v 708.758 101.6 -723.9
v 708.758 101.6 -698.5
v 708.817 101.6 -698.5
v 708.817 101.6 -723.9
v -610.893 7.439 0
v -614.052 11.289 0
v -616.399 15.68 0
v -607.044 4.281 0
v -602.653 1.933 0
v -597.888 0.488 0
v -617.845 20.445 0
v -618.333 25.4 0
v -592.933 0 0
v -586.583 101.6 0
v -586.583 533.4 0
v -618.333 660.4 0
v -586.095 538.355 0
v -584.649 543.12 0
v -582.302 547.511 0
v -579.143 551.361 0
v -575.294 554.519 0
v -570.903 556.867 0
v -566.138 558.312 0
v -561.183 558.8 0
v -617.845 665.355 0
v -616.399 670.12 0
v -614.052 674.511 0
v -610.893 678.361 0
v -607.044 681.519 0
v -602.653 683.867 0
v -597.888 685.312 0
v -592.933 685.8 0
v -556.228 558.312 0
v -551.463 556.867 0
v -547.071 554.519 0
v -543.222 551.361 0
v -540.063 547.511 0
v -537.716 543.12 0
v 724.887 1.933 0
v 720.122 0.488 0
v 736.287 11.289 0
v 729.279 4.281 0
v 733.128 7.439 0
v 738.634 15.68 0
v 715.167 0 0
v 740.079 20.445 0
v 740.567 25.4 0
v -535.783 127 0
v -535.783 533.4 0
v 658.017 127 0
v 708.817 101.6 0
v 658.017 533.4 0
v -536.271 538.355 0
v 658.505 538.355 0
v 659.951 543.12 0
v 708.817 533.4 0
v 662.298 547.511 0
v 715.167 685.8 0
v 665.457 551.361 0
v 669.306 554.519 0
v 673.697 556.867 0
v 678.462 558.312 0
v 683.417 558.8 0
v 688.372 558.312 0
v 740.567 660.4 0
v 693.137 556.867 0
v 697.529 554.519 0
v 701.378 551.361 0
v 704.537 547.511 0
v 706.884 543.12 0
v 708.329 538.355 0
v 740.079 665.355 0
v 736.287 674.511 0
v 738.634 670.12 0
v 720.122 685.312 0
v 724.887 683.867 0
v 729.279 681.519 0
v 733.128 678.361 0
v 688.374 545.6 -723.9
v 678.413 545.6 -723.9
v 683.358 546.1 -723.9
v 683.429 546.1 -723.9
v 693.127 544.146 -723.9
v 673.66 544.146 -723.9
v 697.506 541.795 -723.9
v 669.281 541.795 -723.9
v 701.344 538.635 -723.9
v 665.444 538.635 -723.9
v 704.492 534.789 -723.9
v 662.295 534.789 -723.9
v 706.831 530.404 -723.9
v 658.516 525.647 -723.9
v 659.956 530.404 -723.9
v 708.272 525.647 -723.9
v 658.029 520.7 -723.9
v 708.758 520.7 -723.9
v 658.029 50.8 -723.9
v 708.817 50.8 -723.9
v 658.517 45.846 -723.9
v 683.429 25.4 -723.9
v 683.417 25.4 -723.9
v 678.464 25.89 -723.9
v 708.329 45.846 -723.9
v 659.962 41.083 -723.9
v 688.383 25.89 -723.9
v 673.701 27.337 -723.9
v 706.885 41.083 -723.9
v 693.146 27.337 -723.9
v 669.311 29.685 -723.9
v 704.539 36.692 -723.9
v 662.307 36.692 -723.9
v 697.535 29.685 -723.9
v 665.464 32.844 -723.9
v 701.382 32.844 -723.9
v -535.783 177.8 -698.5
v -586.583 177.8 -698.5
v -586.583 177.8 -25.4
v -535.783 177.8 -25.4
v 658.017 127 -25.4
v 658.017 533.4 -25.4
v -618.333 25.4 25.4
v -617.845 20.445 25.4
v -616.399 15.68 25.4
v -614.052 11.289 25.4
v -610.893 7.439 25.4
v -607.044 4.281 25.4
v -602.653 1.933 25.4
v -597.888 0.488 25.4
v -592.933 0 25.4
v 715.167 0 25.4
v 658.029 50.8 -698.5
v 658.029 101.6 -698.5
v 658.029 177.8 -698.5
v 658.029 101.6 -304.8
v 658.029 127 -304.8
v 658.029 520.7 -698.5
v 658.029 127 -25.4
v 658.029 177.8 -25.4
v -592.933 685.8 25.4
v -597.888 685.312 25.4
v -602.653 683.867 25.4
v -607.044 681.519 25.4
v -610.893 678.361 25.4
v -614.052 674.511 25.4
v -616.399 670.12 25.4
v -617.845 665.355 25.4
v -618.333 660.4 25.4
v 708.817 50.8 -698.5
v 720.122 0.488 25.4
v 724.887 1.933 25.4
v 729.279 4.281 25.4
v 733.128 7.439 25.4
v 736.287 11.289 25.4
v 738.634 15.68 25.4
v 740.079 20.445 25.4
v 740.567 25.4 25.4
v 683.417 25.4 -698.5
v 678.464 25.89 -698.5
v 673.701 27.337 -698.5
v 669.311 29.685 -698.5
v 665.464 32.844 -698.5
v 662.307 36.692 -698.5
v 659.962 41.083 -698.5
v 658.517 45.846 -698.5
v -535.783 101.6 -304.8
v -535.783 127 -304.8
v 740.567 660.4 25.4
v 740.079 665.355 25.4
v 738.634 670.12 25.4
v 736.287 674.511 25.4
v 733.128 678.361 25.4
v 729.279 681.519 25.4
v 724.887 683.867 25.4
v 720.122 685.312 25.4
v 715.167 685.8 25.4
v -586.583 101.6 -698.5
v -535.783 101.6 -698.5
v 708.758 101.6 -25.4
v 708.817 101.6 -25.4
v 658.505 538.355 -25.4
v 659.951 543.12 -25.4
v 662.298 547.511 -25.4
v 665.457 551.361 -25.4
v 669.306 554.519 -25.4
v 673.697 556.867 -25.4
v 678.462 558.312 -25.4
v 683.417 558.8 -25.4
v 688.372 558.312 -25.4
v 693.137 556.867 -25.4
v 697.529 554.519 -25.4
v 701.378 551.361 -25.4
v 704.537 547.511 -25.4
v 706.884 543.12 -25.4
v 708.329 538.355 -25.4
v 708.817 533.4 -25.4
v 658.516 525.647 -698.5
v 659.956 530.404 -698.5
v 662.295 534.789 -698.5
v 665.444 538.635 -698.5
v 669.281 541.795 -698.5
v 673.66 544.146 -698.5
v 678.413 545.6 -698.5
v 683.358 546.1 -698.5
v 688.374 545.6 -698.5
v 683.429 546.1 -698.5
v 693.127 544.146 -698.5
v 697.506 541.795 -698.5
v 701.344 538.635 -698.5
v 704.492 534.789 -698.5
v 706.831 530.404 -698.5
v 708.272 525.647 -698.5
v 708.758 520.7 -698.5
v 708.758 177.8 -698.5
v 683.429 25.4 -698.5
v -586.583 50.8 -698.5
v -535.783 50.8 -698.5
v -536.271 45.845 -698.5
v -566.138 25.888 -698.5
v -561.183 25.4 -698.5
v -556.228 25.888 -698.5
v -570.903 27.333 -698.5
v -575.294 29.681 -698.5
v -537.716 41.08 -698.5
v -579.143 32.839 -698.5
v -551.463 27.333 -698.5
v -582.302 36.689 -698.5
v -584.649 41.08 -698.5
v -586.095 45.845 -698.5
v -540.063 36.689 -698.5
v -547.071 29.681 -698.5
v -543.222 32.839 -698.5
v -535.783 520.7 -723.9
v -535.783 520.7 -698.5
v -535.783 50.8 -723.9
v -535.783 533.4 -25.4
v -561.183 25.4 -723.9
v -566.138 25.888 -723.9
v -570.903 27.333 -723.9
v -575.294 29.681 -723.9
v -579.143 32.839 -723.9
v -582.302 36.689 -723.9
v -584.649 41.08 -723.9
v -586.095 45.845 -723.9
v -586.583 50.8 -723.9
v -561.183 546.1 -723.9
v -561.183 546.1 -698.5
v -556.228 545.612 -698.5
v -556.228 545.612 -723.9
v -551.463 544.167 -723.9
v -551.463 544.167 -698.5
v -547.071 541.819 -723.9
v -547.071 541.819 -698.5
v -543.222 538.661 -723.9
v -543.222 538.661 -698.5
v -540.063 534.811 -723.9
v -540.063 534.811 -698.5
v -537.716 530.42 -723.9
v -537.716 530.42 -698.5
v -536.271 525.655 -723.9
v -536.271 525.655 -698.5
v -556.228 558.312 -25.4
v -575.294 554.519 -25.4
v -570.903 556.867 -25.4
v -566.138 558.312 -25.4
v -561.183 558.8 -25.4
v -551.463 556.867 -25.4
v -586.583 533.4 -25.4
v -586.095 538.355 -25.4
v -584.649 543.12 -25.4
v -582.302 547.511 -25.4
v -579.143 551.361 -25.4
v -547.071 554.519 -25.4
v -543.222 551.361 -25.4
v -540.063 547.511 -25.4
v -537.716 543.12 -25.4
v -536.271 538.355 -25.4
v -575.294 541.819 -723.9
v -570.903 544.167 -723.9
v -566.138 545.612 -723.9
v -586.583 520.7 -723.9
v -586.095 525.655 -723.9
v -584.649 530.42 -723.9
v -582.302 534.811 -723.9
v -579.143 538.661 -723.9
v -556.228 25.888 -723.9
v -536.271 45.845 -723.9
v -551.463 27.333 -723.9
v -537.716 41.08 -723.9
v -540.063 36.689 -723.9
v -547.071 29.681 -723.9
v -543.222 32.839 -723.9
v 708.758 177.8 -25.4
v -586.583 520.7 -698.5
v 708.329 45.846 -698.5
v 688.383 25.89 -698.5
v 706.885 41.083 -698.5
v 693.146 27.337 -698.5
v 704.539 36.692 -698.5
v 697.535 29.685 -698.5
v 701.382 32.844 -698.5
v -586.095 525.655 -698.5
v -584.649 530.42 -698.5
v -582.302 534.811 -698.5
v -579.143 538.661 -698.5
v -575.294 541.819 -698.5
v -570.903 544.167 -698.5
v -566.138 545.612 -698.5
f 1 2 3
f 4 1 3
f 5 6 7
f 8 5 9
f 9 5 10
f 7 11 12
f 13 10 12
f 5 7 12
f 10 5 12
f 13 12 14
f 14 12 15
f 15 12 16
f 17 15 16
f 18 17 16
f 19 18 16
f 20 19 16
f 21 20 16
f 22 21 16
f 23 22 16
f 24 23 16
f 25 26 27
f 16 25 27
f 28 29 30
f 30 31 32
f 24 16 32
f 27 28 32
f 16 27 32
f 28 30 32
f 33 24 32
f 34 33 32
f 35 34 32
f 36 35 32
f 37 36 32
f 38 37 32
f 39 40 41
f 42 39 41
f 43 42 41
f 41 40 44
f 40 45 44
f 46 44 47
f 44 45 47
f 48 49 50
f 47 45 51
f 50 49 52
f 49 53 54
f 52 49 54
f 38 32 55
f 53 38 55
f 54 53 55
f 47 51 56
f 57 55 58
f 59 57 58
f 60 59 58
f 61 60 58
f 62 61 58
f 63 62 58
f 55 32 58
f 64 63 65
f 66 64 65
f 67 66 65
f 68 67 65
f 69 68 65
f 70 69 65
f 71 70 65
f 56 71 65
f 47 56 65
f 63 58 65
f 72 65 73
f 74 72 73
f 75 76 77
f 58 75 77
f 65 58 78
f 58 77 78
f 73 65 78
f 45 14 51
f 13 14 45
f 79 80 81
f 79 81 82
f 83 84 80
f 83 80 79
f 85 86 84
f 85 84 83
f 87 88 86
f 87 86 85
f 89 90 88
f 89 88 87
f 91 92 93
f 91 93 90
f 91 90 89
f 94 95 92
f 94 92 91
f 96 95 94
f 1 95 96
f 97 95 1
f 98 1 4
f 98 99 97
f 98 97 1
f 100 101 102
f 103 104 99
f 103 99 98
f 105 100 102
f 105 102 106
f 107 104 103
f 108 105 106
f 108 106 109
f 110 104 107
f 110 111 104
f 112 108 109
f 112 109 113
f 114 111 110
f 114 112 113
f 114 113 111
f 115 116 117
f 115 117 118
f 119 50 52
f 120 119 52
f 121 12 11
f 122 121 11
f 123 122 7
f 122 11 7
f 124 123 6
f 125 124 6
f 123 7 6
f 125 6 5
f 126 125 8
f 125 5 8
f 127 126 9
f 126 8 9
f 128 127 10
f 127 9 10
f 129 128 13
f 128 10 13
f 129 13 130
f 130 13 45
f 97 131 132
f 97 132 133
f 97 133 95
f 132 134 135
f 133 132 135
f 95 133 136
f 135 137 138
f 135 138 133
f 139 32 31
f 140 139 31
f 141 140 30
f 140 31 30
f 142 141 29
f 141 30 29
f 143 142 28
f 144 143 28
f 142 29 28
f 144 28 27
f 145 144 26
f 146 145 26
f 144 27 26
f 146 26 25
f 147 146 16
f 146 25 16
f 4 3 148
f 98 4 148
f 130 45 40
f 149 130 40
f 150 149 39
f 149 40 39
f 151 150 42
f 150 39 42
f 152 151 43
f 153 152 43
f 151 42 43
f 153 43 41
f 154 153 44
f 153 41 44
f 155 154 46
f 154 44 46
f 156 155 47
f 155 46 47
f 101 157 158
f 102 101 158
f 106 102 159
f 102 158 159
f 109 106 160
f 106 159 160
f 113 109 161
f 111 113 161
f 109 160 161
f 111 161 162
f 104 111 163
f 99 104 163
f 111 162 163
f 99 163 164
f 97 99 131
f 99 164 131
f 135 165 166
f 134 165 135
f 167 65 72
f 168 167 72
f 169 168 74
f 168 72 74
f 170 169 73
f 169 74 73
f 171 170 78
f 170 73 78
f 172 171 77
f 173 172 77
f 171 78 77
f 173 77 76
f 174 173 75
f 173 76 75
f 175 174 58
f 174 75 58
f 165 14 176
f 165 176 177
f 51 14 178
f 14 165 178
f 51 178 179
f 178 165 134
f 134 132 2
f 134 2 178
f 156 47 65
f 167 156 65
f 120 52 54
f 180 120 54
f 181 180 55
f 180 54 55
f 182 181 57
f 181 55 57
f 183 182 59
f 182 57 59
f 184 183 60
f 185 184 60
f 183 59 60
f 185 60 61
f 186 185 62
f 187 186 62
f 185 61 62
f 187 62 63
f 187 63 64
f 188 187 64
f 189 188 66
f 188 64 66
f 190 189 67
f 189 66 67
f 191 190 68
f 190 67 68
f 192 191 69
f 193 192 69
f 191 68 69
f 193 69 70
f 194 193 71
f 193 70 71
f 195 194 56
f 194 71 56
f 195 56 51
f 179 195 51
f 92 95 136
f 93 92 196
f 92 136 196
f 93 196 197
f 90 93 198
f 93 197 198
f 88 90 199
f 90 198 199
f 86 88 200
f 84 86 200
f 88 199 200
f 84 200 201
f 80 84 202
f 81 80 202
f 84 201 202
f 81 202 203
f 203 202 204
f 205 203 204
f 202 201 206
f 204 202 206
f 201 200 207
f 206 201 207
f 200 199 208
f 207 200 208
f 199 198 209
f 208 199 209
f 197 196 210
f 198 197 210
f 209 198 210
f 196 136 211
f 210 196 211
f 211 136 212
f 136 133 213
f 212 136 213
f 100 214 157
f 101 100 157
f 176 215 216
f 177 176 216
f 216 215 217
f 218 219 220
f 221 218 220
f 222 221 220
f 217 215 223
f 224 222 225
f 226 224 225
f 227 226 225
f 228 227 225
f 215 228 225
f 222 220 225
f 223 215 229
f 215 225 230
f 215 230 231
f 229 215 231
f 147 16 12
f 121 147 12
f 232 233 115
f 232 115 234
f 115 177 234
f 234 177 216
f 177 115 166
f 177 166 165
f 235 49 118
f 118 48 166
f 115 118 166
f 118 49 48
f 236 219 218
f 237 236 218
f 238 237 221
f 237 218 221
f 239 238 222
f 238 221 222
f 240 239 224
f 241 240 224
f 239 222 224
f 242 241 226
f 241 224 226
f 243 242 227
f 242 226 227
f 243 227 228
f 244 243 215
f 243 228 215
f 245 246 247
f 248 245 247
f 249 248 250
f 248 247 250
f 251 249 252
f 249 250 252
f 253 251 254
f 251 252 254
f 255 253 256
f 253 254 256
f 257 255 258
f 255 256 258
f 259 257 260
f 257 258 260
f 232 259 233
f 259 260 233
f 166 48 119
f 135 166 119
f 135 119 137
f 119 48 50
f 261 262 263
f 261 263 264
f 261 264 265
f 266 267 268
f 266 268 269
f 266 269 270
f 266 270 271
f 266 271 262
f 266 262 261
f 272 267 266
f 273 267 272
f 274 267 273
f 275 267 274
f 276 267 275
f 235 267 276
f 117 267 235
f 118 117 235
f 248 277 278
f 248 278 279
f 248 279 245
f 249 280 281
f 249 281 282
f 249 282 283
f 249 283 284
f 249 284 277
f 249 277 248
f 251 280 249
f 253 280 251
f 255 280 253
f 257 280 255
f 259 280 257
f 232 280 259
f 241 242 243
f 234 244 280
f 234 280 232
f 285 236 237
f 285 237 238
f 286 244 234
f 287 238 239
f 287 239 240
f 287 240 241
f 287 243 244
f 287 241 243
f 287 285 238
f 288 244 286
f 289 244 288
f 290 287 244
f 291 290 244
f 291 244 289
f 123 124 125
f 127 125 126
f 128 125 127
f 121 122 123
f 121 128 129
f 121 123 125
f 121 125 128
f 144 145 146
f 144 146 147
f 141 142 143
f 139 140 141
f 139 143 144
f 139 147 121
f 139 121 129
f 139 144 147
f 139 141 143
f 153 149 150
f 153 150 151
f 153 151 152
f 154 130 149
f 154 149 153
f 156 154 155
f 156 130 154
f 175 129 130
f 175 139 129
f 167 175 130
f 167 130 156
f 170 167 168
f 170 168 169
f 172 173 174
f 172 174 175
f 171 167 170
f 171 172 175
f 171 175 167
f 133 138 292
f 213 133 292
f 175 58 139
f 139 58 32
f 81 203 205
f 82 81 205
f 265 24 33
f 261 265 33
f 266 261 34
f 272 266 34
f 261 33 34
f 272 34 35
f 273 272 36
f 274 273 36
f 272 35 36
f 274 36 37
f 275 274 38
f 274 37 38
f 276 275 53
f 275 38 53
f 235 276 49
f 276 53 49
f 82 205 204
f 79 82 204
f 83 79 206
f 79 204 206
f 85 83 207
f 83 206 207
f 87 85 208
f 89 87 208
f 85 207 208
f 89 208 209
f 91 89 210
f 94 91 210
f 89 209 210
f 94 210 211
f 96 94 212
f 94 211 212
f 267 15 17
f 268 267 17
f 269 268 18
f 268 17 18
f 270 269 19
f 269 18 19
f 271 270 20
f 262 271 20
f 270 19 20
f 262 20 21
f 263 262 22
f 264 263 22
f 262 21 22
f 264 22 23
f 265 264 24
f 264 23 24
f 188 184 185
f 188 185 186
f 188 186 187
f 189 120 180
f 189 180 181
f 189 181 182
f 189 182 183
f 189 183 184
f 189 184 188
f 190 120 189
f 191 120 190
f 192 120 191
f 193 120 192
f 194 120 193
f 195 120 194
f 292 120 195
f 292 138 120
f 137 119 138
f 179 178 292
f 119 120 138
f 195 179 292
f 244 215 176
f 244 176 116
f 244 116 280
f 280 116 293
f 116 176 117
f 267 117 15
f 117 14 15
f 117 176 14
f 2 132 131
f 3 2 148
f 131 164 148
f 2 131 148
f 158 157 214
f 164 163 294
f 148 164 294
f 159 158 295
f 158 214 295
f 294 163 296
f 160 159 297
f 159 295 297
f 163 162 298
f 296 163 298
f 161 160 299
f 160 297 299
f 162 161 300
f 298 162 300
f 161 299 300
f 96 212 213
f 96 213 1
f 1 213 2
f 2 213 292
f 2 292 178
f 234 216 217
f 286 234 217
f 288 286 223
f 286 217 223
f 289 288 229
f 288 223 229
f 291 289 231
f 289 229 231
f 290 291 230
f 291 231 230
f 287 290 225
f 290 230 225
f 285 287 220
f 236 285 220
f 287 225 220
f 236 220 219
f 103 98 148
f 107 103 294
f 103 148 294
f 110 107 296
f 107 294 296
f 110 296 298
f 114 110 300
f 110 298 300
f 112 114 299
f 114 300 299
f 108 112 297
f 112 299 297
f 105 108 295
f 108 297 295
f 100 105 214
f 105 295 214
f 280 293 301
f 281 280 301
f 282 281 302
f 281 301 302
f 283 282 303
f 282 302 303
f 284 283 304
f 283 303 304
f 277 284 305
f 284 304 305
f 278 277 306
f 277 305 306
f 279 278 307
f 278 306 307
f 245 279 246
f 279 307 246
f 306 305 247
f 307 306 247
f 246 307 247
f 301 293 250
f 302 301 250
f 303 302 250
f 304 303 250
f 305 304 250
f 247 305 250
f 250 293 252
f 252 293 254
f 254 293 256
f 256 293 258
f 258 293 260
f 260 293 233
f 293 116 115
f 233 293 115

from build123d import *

# Parameters (mm, degrees)
F1_DEPTH  = 25.4
F2_W      = 50.8
F2_H      = 25.4
F3_DEPTH  = 25.4
F5_DEPTH  = 673.1
F4_W      = 1193.8120010341
F4_H      = 25.4
F7_DEPTH  = 25.4
F8_DEPTH  = 279.4
F9_W      = 50.728738308
F9_H      = 76.2
F10_DEPTH = 25.4
F11_W     = 50.8
F11_H     = 76.2
F12_DEPTH = 25.4


# Not quite as in the source:
# - ends of sketch curves that miss each other by under 0.0002 mm in the source are joined


with BuildPart() as f1:
    # F0 (on Top) → F1 (new body)
    with BuildSketch(Plane.XY):
        with BuildLine():
            Line((715.1671976125, 685.8), (-592.9328023875, 685.8))
            ThreePointArc((-592.9328023875, 685.8), (-610.8933146297, 678.3605122421), (-618.3328023875, 660.4))
            Line((-618.3328023875, 660.4), (-618.3328023875, 25.4))
            ThreePointArc((-618.3328023875, 25.4), (-610.8933146297, 7.4394877579), (-592.9328023875, 0))
            Line((-592.9328023875, 0), (715.1671976125, 0))
            ThreePointArc((715.1671976125, 0), (733.1277098546, 7.4394877579), (740.5671976125, 25.4))
            Line((740.5671976125, 25.4), (740.5671976125, 660.4))
            ThreePointArc((740.5671976125, 660.4), (733.1277098546, 678.3605122421), (715.1671976125, 685.8))
        make_face()
    extrude(amount=F1_DEPTH)

    # F2 (on face) → F3 (join)
    with BuildSketch(Plane(origin=(0, 0, 0), x_dir=(1, 0, 0), z_dir=(0, 0, -1))):
        with Locations((-561.1828023875, -114.3)):
            Rectangle(F2_W, F2_H)
        with BuildLine():
            Line((-535.7828023875, -127), (-586.5828023875, -127))
            Line((-586.5828023875, -127), (-586.5828023875, -533.4))
            ThreePointArc((-586.5828023875, -533.4), (-579.1433146297, -551.3605122421), (-561.1828023875, -558.8))
            ThreePointArc((-561.1828023875, -558.8), (-543.2222901454, -551.3605122421), (-535.7828023875, -533.4))
            Line((-535.7828023875, -533.4), (-535.7828023875, -127))
        make_face()
        with BuildLine():
            Line((708.8171976125, -127), (658.0171976125, -127))
            Line((658.0171976125, -127), (658.0171976125, -533.4))
            ThreePointArc((658.0171976125, -533.4), (665.4566853703, -551.3605122421), (683.4171976125, -558.8))
            ThreePointArc((683.4171976125, -558.8), (701.3777098546, -551.3605122421), (708.8171976125, -533.4))
            Line((708.8171976125, -533.4), (708.8171976125, -127))
        make_face()
        with Locations((683.4171976125, -114.3)):
            Rectangle(F2_W, F2_H)
    extrude(amount=F3_DEPTH)

    # F4 (on face) → F5 (join)
    with BuildSketch(Plane(origin=(0, 0, -25.4), x_dir=(1, 0, 0), z_dir=(0, 0, -1))):
        Polygon((-535.7828023875, -127), (-535.7828023875, -101.6), (-586.5828023875, -101.6), (-586.5828023875, -177.8), (-535.7828023875, -177.8), align=None)
        Polygon((708.7579369545, -101.6), (658.0291986465, -101.6), (658.0291986465, -127), (658.0291986465, -177.8), (708.7579369545, -177.8), align=None)
    extrude(amount=F5_DEPTH)

    # F4 (on face) → F7 (join)
    with BuildSketch(Plane(origin=(0, 0, -25.4), x_dir=(1, 0, 0), z_dir=(0, 0, -1))):
        with Locations((61.1231981295, -114.3)):
            Rectangle(F4_W, F4_H)
    extrude(amount=-F7_DEPTH)

    # F4 (on face) → F8 (join)
    with BuildSketch(Plane(origin=(0, 0, -25.4), x_dir=(1, 0, 0), z_dir=(0, 0, -1))):
        with Locations((61.1231981295, -114.3)):
            Rectangle(F4_W, F4_H)
    extrude(amount=F8_DEPTH)

    # F9 (on face) → F10 (join)
    with BuildSketch(Plane(origin=(0, 0, -698.5), x_dir=(1, 0, 0), z_dir=(0, 0, -1))):
        with BuildLine():
            Line((708.7579369545, -177.8), (658.0291986465, -177.8))
            Line((658.0291986465, -177.8), (658.0291986465, -520.7))
            ThreePointArc((658.0291986465, -520.7), (665.4435093373, -538.6352998323), (683.357937235, -546.0999000355))
            Line((683.357937235, -546.0999000355), (683.4291986465, -546.1))
            ThreePointArc((683.4291986465, -546.1), (701.3436262637, -538.6352998323), (708.7579369545, -520.7))
            Line((708.7579369545, -520.7), (708.7579369545, -177.8))
        make_face()
        with Locations((683.3935678005, -139.7)):
            Rectangle(F9_W, F9_H)
        with BuildLine():
            Line((658.0291986465, -50.8), (658.0291986465, -101.6))
            Line((658.0291986465, -101.6), (708.7579369545, -101.6))
            Line((708.7579369545, -101.6), (708.8171976125, -101.6))
            Line((708.8171976125, -101.6), (708.8171976125, -50.8))
            ThreePointArc((708.8171976125, -50.8), (701.3819523594, -32.843731265), (683.4291986452, -25.4000028351))
            Line((683.4291986452, -25.4000028351), (683.4171976125, -25.4))
            ThreePointArc((683.4171976125, -25.4), (665.4644438997, -32.843731265), (658.0291986465, -50.8))
        make_face()
    extrude(amount=F10_DEPTH)

    # F11 (on face) → F12 (join)
    with BuildSketch(Plane(origin=(0, 0, -698.5), x_dir=(1, 0, 0), z_dir=(0, 0, -1))):
        with BuildLine():
            ThreePointArc((-561.1828023875, -25.4), (-579.1433146297, -32.8394877579), (-586.5828023875, -50.8))
            Line((-586.5828023875, -50.8), (-586.5828023875, -101.6))
            Line((-586.5828023875, -101.6), (-535.7828023875, -101.6))
            Line((-535.7828023875, -101.6), (-535.7828023875, -50.8))
            ThreePointArc((-535.7828023875, -50.8), (-543.2222901454, -32.8394877579), (-561.1828023875, -25.4))
        make_face()
        with Locations((-561.1828023875, -139.7)):
            Rectangle(F11_W, F11_H)
        with BuildLine():
            Line((-535.7828023875, -177.8), (-586.5828023875, -177.8))
            Line((-586.5828023875, -177.8), (-586.5828023875, -520.7))
            ThreePointArc((-586.5828023875, -520.7), (-579.1433146297, -538.6605122421), (-561.1828023875, -546.1))
            ThreePointArc((-561.1828023875, -546.1), (-543.2222901454, -538.6605122421), (-535.7828023875, -520.7))
            Line((-535.7828023875, -520.7), (-535.7828023875, -177.8))
        make_face()
    extrude(amount=F12_DEPTH)


solid = f1.part
